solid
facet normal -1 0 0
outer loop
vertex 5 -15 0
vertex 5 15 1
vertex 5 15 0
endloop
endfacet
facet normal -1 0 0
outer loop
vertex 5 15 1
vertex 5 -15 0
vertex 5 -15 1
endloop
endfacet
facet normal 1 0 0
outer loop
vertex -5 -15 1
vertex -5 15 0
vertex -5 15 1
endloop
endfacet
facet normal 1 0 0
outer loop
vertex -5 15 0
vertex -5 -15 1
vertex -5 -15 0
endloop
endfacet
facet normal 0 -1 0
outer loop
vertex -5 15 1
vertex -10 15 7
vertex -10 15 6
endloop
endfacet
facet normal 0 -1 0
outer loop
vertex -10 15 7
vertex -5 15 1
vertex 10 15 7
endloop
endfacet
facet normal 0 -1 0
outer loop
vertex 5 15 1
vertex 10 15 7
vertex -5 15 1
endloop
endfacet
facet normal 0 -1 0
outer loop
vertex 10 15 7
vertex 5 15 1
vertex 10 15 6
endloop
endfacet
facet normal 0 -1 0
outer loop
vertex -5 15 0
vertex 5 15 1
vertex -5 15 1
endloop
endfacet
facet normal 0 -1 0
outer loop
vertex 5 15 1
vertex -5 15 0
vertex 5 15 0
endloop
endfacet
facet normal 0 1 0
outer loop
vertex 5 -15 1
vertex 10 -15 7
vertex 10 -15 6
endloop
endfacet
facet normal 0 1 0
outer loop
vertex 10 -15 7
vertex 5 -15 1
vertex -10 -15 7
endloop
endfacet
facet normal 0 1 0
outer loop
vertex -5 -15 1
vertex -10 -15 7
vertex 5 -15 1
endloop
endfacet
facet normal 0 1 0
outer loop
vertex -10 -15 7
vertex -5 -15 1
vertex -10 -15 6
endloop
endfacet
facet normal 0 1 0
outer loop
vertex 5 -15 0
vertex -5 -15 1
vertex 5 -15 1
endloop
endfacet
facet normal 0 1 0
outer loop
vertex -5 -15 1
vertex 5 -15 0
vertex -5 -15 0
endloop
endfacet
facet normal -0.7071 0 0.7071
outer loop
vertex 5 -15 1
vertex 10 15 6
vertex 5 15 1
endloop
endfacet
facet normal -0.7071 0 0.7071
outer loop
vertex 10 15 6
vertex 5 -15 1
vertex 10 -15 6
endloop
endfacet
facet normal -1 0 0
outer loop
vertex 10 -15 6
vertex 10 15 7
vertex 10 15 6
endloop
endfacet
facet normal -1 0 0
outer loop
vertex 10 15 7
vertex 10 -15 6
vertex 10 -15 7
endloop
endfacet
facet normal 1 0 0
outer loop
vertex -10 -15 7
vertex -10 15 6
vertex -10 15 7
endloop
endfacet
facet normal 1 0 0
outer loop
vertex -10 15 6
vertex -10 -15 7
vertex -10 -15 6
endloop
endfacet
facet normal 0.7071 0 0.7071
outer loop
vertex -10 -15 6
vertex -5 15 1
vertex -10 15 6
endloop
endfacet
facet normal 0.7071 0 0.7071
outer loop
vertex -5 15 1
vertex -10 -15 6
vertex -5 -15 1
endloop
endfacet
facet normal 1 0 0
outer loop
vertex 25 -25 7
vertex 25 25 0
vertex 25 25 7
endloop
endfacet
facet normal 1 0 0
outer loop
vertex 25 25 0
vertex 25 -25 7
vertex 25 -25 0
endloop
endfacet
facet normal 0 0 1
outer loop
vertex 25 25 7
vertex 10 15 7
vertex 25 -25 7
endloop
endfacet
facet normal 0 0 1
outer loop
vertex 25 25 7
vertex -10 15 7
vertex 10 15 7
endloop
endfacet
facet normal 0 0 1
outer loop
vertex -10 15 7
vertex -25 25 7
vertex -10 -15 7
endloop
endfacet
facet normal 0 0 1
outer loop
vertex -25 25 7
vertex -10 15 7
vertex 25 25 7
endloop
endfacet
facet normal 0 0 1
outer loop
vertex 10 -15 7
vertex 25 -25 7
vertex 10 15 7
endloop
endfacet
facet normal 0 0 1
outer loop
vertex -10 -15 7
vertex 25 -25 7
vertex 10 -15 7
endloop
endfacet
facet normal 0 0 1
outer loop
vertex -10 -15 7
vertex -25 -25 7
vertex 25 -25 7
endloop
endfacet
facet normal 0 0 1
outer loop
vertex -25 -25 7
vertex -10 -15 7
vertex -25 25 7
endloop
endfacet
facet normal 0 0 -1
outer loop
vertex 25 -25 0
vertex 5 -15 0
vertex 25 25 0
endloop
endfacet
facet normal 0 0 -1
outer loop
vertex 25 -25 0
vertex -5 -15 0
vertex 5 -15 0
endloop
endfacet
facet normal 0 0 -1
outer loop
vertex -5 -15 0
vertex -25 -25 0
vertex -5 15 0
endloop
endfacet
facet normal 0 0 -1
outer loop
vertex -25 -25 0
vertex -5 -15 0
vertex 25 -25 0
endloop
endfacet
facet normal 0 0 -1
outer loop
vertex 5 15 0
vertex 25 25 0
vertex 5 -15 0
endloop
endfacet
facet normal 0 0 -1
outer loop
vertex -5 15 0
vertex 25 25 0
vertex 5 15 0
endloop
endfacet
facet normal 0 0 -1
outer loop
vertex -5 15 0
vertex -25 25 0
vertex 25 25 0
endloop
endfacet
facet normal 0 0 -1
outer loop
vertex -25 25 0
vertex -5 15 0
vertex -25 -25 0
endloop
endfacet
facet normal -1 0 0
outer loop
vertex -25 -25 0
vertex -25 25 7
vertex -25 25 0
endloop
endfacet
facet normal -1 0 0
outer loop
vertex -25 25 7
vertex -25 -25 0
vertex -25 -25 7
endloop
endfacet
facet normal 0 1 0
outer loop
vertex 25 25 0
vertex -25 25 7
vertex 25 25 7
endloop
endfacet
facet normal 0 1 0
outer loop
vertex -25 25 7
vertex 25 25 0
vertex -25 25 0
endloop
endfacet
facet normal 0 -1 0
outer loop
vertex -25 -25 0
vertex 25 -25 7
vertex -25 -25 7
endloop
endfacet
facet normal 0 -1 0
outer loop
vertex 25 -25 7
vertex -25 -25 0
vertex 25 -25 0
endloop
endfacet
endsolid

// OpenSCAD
$fn = 100;
g = 0.001;

// винт M3
M3D  =  3.00;
M3Dk =  5.60;
M3K  =  1.65;
M3L  = 50.00-M3Dk;
// гайка M3
M3Nd =  5.50/cos(30);
M3Nl =  3.00;

/*
 * Винт
 * D  - диаметр резьбы
 * L  - длина резьбы
 * Dk - диаметр шляпки
 * K  - высота шляпки
 */
module screw(D, L, Dk, K)
{
	screw_hat(D, Dk, K);
	translate([0, 0, K])
	screw_body(D, L);
}
module screw_hat (D, Dk, K) {cylinder(d1 = Dk, d2 = D, h = K       );}
module screw_body(D, L)     {cylinder(d  = D ,         h = L       );}
module screw_nut (D, L)     {cylinder(d  = D ,         h = L, $fn=6);}

// параметры контакта p50b1
PD1 =  0.500; // диаметр острия
PD2 =  0.680; // диаметр оболочки
PH0 =  0.433; // высота заточки
PH1 =  3.350; // высота острия
PH2 = 13.000; // высота оболочки

module probe()
{
	color("Silver")
	{
		cylinder(d1=0, d2=PD1, h=PH0);
		translate([0, 0, PH0])
		cylinder(d=PD1, h=PH1-PH0);
	}

	color("Gold")
	translate([0, 0, PH1])
	cylinder(d=PD2, h=PH2);
}

// электрод
EW = 10;
EL = 10;
EH = 0.45;

module electrode()
{
	color("red")
	translate([0, 0, EH/2])
	cube([EW, EL, EH], center = true);
}

// транслятор
W0 = 50.00;
W1 = 10.00;
W2 = 20.00;

L0 = 50.00;
L1 = 30.00;

H0 =  7.00;
H2 =  5.00;
H1 = (H0-H2)/2;
H3 = H1;

G  =  0.05;

module base()
{
	difference()
	{
		union()
		{
			translate([-W0/2, -L0/2, 0])
			cube([W0, L0, H0]);
		}

		union()
		{
			translate([-W1/2, -L1/2, -g])
			cube([W1, L1, H1+2*g]);

			hull()
			{
				translate([-W1/2, -L1/2, H1])
				cube([W1, L1, g]);

				translate([-W2/2, -L1/2, H1+H2])
				cube([W2, L1, H3+g]);
			}
		}
	}
}

!base();
